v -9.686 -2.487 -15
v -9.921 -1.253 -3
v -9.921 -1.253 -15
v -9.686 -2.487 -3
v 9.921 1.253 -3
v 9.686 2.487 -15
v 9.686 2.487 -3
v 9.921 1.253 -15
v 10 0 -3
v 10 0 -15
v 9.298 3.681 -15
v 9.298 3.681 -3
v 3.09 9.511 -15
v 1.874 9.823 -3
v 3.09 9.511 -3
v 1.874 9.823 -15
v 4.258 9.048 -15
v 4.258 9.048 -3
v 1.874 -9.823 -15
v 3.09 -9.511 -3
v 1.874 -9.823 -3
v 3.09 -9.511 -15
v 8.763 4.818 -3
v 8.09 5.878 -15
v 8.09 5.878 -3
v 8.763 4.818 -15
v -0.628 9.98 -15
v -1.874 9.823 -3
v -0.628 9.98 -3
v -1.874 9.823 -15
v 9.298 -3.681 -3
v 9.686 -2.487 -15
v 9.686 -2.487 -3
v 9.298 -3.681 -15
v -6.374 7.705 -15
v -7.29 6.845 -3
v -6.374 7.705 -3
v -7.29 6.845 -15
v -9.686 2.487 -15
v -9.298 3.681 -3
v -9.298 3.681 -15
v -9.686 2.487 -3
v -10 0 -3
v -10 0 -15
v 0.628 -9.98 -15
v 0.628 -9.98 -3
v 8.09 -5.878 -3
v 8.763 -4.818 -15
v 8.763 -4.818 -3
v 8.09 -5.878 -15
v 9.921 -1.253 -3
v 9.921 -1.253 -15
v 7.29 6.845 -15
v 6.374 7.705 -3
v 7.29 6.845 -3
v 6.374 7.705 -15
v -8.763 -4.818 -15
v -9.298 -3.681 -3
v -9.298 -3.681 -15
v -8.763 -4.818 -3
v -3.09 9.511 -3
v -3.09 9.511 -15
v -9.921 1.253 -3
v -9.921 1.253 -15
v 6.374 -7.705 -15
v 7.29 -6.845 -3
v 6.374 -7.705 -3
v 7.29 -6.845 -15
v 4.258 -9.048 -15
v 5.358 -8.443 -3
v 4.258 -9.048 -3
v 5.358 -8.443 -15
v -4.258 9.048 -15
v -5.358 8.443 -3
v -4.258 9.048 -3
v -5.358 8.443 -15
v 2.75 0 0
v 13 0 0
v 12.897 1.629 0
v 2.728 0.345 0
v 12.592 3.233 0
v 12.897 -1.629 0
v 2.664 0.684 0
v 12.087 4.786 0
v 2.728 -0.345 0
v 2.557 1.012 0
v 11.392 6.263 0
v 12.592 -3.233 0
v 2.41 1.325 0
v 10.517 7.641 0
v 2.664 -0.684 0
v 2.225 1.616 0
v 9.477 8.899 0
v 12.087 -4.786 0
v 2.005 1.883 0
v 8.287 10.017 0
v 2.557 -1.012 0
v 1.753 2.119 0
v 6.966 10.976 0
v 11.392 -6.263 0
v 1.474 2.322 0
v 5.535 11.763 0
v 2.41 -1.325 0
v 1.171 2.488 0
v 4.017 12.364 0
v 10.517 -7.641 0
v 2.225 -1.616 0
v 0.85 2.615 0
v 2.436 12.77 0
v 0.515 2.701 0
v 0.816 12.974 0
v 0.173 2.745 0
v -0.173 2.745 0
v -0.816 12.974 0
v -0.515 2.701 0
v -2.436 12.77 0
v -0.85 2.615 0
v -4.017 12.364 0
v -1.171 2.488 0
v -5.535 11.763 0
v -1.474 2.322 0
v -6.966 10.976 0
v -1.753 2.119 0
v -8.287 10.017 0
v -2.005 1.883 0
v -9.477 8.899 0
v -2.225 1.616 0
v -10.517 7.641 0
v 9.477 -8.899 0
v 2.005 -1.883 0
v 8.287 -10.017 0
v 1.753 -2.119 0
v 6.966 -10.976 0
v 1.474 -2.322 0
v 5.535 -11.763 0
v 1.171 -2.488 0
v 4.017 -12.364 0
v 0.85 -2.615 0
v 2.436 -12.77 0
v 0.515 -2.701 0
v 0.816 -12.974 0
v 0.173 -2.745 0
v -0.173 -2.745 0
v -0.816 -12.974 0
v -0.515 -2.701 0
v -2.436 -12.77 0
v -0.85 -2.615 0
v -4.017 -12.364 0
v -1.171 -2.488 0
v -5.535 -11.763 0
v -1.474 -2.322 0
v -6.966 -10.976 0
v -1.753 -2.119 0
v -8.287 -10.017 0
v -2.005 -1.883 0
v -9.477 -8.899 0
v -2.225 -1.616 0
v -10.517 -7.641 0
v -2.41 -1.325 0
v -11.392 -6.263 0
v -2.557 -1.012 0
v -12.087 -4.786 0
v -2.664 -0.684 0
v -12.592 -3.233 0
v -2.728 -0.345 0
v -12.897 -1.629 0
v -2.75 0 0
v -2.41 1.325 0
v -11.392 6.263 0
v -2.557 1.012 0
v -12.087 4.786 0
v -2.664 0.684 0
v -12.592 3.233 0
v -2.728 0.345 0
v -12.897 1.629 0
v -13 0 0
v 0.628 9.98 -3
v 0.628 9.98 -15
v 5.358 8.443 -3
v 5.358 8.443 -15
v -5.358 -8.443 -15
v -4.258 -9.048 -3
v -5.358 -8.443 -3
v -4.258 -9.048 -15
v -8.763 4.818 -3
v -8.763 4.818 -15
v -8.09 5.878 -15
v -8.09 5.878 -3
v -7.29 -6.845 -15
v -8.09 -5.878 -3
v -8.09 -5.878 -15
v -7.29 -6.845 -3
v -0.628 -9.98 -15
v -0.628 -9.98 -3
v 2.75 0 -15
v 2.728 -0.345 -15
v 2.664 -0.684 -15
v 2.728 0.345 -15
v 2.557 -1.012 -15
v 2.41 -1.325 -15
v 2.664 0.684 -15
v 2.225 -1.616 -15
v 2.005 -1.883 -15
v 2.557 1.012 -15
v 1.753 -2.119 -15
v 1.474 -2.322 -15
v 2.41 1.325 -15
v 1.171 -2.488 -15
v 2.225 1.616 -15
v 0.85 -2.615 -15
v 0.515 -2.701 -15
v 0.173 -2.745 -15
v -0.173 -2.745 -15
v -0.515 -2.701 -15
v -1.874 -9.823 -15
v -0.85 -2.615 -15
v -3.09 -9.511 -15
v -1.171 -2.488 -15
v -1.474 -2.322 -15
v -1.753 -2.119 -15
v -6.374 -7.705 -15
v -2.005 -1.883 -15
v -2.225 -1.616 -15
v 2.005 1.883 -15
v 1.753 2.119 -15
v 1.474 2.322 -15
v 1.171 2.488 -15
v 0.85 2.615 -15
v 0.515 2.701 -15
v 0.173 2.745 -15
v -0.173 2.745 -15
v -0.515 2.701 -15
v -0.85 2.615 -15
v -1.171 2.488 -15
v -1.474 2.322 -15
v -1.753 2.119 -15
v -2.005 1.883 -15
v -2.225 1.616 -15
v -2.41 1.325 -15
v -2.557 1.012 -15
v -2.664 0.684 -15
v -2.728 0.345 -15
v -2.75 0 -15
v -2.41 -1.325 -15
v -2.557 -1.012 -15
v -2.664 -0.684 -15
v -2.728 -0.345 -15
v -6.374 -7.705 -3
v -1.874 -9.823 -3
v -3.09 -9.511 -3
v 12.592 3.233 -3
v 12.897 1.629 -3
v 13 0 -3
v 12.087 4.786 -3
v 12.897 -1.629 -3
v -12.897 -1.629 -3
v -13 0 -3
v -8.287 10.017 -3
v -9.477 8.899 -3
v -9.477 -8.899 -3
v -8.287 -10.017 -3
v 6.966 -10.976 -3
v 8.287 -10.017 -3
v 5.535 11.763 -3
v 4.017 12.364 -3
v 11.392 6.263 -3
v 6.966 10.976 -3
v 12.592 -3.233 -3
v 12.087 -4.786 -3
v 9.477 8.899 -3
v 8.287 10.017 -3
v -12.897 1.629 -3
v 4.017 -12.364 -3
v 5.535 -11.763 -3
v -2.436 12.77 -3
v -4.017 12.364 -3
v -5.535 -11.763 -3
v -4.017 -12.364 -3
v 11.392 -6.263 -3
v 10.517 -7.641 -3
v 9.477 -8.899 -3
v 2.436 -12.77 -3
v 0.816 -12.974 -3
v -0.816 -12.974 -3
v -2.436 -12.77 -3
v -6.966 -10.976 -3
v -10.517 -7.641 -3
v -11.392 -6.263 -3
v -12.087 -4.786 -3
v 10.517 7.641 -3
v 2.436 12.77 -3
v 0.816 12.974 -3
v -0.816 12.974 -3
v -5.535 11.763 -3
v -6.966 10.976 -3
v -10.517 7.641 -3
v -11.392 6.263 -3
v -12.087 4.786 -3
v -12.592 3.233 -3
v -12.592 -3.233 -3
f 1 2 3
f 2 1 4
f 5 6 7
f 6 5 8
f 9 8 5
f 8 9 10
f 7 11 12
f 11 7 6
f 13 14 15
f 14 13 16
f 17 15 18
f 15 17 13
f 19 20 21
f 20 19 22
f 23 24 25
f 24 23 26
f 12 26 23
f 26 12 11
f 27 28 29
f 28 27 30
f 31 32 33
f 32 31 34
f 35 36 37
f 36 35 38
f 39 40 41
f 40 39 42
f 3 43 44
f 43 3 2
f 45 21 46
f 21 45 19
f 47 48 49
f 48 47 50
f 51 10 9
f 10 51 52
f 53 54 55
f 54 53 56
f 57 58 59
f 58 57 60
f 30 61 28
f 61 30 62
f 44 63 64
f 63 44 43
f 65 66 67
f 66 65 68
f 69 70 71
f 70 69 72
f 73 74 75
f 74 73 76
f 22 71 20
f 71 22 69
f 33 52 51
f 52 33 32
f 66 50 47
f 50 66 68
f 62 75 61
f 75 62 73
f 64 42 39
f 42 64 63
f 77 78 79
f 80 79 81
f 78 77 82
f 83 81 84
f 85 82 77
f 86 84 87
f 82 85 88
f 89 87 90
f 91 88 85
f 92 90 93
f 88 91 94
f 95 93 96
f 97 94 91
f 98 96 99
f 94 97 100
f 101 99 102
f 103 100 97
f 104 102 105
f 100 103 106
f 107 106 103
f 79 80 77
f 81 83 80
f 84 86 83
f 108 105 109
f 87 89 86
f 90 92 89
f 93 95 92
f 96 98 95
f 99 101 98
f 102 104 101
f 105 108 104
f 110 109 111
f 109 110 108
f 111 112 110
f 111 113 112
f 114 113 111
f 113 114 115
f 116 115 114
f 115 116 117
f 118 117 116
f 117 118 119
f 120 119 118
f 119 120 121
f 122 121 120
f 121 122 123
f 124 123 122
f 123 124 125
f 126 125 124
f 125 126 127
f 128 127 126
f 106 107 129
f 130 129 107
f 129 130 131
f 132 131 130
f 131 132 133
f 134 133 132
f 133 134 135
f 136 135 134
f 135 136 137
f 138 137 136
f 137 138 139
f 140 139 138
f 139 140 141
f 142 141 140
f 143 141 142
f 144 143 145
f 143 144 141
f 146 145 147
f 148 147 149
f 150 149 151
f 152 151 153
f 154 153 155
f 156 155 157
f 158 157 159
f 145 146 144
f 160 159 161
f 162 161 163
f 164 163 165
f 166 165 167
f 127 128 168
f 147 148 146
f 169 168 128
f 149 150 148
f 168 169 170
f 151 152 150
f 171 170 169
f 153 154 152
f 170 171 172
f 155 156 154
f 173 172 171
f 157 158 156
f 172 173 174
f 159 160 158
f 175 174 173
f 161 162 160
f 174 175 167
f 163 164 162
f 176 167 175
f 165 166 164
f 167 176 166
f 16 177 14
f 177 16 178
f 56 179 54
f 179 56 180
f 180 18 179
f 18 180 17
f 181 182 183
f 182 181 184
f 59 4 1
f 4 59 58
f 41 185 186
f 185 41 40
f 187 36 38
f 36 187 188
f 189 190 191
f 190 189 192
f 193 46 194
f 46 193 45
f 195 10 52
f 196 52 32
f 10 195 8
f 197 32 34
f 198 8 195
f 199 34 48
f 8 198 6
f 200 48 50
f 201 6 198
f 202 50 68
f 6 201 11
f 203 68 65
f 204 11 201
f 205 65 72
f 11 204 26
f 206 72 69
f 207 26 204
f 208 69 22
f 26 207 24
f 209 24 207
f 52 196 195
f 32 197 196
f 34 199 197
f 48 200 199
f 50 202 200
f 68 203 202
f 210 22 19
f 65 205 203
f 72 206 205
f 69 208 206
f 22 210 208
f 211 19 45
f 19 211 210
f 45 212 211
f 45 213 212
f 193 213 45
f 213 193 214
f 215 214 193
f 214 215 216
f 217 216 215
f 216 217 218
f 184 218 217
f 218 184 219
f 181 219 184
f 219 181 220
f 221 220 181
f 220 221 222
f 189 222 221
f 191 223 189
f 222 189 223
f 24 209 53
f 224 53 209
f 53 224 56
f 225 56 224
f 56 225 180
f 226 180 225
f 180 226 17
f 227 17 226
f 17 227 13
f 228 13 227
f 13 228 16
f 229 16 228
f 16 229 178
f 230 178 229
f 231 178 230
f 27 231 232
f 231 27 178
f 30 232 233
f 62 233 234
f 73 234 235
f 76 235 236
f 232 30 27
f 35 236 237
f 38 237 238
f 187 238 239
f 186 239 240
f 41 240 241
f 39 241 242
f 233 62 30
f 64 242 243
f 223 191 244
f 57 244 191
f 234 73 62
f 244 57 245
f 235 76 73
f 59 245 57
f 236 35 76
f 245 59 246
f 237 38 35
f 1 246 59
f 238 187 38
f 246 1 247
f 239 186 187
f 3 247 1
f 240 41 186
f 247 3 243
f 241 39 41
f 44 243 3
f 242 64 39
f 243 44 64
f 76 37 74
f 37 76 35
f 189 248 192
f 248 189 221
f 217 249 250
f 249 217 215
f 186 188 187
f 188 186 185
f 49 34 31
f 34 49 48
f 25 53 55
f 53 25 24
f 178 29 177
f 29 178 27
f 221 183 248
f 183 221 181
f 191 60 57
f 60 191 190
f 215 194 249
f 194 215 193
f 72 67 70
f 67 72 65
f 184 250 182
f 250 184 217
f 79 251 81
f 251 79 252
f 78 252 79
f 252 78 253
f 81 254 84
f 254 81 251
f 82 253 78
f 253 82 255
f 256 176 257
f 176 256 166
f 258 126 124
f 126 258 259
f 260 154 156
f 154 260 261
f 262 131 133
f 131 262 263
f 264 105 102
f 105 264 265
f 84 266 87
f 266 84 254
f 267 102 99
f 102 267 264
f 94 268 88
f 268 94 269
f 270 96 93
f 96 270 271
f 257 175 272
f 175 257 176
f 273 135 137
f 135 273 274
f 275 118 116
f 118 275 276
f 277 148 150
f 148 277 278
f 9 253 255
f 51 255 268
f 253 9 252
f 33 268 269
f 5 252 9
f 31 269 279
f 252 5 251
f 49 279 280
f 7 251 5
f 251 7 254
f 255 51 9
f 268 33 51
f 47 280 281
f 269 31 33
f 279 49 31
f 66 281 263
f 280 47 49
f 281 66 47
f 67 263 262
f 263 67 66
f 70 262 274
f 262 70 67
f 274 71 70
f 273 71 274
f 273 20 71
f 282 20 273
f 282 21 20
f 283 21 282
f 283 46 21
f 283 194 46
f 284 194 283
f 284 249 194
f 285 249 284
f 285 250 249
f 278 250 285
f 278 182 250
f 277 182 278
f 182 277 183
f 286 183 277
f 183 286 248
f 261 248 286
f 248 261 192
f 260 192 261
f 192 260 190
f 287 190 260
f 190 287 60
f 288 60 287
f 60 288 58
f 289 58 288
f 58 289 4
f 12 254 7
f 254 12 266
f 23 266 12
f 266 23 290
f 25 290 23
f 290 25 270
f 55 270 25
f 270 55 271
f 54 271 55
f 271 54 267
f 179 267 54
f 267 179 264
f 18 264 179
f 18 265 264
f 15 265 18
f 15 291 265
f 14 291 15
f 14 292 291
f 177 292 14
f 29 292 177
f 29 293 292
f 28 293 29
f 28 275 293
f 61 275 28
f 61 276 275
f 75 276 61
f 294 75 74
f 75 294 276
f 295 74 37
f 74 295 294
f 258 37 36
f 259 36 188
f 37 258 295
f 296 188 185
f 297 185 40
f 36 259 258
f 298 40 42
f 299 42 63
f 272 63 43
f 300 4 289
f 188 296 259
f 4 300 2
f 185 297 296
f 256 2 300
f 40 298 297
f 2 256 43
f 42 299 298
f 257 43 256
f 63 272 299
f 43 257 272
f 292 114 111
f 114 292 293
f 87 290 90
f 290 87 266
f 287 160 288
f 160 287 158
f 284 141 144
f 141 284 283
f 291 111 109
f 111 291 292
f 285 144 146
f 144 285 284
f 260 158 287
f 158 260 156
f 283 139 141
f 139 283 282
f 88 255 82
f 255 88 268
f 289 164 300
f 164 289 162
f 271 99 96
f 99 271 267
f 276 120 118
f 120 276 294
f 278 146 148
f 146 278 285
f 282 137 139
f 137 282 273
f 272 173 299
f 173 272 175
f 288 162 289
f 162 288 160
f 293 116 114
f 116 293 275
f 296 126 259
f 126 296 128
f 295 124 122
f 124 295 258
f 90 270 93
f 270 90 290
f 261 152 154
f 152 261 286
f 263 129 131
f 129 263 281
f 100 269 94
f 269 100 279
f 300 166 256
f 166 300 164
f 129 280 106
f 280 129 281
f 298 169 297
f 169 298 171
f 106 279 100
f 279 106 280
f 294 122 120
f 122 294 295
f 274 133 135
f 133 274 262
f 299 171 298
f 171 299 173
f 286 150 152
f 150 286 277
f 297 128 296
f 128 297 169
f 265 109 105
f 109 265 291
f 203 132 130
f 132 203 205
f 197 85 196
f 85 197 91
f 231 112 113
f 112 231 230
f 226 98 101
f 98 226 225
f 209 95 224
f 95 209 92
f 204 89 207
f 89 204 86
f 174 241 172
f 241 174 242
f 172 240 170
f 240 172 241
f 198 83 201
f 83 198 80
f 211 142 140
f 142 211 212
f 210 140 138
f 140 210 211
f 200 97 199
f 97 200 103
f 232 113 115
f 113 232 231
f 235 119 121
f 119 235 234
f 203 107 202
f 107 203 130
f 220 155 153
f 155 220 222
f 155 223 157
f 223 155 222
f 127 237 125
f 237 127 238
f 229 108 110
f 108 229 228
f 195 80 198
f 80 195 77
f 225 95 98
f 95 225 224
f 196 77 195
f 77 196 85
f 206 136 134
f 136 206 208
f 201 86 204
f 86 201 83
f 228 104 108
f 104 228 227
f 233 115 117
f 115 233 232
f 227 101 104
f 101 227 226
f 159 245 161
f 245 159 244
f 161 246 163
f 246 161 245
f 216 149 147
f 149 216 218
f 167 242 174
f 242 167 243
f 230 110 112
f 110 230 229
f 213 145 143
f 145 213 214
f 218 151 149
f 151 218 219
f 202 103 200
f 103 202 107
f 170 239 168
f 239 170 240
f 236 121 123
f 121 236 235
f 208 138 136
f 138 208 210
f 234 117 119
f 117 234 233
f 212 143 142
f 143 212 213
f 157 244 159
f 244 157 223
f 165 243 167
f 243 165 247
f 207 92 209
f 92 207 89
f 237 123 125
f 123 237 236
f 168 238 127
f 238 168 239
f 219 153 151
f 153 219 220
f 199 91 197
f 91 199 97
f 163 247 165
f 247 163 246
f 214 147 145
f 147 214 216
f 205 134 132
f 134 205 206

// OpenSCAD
$fn = 50;


difference() {
	union() {
		translate(v = [0, 0, -15.0000000000]) {
			cylinder(h = 15, r = 10.0000000000);
		}
		translate(v = [0, 0, -3.0000000000]) {
			cylinder(h = 3, r = 13.0000000000);
		}
	}
	union() {
		#translate(v = [0, 0, -15]) {
			cylinder(h = 15, r = 2.7500000000);
		}
	}
}
